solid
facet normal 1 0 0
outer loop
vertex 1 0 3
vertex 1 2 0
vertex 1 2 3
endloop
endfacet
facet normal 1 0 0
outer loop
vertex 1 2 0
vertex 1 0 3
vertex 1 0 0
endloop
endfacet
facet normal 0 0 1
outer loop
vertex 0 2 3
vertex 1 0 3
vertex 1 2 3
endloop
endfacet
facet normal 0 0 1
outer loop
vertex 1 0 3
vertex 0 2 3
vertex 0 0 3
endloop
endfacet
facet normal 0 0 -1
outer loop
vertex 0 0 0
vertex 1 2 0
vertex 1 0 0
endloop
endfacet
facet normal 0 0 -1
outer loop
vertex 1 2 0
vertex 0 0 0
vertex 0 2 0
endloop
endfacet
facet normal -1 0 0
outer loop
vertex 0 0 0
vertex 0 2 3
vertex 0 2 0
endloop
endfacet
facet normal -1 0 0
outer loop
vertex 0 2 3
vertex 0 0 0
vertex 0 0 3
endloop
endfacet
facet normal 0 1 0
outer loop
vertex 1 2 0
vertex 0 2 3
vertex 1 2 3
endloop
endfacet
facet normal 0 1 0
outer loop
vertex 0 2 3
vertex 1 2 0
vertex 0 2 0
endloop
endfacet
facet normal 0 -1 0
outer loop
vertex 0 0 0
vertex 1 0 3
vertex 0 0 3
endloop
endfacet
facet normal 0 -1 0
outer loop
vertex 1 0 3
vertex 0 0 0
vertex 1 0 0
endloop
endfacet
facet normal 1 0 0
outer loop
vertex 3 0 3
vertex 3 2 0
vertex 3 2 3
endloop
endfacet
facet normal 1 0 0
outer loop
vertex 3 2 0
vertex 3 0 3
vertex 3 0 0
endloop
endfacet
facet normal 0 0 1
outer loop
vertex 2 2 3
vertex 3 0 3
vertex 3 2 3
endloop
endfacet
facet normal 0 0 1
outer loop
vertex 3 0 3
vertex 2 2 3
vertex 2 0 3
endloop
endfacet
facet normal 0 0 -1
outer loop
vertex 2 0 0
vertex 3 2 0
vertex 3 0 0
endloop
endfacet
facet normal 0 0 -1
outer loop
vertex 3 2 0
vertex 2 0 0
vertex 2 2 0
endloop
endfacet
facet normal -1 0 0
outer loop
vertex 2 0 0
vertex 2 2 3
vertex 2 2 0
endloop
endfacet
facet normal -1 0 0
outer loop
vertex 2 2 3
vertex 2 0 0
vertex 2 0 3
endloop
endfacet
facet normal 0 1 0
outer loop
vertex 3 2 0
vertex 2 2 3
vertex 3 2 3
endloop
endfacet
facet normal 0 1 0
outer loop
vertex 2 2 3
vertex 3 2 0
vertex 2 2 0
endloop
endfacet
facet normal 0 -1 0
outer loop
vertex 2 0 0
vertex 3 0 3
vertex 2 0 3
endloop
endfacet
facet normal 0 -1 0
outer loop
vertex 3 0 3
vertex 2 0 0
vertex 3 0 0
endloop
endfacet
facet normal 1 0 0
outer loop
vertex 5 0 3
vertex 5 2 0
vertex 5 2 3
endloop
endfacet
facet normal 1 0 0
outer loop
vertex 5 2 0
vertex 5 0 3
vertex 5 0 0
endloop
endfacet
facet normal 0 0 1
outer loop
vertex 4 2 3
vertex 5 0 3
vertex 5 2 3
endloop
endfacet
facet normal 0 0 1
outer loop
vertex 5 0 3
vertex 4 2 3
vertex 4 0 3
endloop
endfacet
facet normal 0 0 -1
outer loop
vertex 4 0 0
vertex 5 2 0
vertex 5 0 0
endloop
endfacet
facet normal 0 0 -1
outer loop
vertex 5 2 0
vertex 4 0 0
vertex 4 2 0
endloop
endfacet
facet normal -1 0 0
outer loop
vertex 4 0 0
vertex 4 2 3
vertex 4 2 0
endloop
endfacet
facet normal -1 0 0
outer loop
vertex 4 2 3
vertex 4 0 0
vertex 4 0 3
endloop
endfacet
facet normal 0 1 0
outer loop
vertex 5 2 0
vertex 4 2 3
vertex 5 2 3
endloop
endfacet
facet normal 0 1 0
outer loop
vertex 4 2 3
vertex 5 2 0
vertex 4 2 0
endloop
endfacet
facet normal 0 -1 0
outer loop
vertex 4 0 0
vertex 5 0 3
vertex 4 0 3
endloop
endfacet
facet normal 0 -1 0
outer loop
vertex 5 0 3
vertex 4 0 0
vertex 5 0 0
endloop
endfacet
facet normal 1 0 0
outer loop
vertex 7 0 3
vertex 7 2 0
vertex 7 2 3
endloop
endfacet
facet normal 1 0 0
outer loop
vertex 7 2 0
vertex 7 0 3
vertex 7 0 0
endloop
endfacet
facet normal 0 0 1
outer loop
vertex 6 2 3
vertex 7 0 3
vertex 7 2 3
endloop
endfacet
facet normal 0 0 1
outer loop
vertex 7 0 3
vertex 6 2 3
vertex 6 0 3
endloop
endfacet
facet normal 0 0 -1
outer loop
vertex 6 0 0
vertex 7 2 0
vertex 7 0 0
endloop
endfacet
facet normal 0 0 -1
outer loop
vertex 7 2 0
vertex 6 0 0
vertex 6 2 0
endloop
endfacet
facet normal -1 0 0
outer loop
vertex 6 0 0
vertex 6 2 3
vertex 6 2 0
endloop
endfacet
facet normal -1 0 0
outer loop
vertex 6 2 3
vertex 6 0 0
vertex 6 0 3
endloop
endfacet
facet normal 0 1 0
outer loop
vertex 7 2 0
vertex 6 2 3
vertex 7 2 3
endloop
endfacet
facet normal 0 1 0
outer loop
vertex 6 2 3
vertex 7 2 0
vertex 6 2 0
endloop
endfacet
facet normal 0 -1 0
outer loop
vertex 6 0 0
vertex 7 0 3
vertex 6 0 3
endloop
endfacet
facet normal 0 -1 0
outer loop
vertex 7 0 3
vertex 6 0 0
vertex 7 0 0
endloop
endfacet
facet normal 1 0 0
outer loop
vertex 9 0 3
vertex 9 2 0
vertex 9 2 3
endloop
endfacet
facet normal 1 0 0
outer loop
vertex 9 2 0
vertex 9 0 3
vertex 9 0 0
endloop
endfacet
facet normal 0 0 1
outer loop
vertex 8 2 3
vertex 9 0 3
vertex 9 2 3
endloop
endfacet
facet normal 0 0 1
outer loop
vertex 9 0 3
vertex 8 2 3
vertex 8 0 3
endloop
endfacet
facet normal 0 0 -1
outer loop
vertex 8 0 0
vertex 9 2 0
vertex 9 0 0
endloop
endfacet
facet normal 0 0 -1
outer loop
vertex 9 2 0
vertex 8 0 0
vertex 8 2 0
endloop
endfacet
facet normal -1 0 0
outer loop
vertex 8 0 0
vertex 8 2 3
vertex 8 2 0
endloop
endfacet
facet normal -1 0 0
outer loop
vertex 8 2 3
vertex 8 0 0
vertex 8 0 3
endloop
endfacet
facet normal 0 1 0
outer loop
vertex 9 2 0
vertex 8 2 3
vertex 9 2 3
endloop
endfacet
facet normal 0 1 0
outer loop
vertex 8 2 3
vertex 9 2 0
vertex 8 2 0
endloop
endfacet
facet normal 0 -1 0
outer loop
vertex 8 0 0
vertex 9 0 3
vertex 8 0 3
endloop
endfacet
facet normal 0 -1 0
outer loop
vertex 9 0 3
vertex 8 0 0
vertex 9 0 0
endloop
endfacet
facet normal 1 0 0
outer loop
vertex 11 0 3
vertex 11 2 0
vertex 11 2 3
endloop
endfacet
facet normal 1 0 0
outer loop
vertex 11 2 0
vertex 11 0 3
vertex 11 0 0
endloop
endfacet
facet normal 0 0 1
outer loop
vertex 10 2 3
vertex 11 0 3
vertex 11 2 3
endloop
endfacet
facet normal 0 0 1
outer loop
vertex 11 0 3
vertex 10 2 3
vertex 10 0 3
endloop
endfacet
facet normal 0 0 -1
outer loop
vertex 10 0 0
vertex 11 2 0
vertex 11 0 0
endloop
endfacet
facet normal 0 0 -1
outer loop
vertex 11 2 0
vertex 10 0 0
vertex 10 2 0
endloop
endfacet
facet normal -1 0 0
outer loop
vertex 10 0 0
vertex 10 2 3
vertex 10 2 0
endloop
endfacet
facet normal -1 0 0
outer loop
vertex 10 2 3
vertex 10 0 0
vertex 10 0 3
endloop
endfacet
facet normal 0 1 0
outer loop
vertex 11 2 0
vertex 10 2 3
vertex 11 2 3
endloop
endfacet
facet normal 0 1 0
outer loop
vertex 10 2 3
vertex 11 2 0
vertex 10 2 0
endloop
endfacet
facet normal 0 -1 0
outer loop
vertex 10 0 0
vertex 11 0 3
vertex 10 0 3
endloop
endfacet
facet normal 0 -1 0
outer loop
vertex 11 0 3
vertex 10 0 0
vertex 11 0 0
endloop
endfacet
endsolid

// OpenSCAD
function twice(x) = x * 2;
module row(n = 3) {
    for (i = [0:n - 1]) translate([twice(i), 0, 0]) children();
}
values = [for (i = [0:3]) if (i != 2) each [i, i * i]];
row(len(values)) cube([1, 2, 3]);
